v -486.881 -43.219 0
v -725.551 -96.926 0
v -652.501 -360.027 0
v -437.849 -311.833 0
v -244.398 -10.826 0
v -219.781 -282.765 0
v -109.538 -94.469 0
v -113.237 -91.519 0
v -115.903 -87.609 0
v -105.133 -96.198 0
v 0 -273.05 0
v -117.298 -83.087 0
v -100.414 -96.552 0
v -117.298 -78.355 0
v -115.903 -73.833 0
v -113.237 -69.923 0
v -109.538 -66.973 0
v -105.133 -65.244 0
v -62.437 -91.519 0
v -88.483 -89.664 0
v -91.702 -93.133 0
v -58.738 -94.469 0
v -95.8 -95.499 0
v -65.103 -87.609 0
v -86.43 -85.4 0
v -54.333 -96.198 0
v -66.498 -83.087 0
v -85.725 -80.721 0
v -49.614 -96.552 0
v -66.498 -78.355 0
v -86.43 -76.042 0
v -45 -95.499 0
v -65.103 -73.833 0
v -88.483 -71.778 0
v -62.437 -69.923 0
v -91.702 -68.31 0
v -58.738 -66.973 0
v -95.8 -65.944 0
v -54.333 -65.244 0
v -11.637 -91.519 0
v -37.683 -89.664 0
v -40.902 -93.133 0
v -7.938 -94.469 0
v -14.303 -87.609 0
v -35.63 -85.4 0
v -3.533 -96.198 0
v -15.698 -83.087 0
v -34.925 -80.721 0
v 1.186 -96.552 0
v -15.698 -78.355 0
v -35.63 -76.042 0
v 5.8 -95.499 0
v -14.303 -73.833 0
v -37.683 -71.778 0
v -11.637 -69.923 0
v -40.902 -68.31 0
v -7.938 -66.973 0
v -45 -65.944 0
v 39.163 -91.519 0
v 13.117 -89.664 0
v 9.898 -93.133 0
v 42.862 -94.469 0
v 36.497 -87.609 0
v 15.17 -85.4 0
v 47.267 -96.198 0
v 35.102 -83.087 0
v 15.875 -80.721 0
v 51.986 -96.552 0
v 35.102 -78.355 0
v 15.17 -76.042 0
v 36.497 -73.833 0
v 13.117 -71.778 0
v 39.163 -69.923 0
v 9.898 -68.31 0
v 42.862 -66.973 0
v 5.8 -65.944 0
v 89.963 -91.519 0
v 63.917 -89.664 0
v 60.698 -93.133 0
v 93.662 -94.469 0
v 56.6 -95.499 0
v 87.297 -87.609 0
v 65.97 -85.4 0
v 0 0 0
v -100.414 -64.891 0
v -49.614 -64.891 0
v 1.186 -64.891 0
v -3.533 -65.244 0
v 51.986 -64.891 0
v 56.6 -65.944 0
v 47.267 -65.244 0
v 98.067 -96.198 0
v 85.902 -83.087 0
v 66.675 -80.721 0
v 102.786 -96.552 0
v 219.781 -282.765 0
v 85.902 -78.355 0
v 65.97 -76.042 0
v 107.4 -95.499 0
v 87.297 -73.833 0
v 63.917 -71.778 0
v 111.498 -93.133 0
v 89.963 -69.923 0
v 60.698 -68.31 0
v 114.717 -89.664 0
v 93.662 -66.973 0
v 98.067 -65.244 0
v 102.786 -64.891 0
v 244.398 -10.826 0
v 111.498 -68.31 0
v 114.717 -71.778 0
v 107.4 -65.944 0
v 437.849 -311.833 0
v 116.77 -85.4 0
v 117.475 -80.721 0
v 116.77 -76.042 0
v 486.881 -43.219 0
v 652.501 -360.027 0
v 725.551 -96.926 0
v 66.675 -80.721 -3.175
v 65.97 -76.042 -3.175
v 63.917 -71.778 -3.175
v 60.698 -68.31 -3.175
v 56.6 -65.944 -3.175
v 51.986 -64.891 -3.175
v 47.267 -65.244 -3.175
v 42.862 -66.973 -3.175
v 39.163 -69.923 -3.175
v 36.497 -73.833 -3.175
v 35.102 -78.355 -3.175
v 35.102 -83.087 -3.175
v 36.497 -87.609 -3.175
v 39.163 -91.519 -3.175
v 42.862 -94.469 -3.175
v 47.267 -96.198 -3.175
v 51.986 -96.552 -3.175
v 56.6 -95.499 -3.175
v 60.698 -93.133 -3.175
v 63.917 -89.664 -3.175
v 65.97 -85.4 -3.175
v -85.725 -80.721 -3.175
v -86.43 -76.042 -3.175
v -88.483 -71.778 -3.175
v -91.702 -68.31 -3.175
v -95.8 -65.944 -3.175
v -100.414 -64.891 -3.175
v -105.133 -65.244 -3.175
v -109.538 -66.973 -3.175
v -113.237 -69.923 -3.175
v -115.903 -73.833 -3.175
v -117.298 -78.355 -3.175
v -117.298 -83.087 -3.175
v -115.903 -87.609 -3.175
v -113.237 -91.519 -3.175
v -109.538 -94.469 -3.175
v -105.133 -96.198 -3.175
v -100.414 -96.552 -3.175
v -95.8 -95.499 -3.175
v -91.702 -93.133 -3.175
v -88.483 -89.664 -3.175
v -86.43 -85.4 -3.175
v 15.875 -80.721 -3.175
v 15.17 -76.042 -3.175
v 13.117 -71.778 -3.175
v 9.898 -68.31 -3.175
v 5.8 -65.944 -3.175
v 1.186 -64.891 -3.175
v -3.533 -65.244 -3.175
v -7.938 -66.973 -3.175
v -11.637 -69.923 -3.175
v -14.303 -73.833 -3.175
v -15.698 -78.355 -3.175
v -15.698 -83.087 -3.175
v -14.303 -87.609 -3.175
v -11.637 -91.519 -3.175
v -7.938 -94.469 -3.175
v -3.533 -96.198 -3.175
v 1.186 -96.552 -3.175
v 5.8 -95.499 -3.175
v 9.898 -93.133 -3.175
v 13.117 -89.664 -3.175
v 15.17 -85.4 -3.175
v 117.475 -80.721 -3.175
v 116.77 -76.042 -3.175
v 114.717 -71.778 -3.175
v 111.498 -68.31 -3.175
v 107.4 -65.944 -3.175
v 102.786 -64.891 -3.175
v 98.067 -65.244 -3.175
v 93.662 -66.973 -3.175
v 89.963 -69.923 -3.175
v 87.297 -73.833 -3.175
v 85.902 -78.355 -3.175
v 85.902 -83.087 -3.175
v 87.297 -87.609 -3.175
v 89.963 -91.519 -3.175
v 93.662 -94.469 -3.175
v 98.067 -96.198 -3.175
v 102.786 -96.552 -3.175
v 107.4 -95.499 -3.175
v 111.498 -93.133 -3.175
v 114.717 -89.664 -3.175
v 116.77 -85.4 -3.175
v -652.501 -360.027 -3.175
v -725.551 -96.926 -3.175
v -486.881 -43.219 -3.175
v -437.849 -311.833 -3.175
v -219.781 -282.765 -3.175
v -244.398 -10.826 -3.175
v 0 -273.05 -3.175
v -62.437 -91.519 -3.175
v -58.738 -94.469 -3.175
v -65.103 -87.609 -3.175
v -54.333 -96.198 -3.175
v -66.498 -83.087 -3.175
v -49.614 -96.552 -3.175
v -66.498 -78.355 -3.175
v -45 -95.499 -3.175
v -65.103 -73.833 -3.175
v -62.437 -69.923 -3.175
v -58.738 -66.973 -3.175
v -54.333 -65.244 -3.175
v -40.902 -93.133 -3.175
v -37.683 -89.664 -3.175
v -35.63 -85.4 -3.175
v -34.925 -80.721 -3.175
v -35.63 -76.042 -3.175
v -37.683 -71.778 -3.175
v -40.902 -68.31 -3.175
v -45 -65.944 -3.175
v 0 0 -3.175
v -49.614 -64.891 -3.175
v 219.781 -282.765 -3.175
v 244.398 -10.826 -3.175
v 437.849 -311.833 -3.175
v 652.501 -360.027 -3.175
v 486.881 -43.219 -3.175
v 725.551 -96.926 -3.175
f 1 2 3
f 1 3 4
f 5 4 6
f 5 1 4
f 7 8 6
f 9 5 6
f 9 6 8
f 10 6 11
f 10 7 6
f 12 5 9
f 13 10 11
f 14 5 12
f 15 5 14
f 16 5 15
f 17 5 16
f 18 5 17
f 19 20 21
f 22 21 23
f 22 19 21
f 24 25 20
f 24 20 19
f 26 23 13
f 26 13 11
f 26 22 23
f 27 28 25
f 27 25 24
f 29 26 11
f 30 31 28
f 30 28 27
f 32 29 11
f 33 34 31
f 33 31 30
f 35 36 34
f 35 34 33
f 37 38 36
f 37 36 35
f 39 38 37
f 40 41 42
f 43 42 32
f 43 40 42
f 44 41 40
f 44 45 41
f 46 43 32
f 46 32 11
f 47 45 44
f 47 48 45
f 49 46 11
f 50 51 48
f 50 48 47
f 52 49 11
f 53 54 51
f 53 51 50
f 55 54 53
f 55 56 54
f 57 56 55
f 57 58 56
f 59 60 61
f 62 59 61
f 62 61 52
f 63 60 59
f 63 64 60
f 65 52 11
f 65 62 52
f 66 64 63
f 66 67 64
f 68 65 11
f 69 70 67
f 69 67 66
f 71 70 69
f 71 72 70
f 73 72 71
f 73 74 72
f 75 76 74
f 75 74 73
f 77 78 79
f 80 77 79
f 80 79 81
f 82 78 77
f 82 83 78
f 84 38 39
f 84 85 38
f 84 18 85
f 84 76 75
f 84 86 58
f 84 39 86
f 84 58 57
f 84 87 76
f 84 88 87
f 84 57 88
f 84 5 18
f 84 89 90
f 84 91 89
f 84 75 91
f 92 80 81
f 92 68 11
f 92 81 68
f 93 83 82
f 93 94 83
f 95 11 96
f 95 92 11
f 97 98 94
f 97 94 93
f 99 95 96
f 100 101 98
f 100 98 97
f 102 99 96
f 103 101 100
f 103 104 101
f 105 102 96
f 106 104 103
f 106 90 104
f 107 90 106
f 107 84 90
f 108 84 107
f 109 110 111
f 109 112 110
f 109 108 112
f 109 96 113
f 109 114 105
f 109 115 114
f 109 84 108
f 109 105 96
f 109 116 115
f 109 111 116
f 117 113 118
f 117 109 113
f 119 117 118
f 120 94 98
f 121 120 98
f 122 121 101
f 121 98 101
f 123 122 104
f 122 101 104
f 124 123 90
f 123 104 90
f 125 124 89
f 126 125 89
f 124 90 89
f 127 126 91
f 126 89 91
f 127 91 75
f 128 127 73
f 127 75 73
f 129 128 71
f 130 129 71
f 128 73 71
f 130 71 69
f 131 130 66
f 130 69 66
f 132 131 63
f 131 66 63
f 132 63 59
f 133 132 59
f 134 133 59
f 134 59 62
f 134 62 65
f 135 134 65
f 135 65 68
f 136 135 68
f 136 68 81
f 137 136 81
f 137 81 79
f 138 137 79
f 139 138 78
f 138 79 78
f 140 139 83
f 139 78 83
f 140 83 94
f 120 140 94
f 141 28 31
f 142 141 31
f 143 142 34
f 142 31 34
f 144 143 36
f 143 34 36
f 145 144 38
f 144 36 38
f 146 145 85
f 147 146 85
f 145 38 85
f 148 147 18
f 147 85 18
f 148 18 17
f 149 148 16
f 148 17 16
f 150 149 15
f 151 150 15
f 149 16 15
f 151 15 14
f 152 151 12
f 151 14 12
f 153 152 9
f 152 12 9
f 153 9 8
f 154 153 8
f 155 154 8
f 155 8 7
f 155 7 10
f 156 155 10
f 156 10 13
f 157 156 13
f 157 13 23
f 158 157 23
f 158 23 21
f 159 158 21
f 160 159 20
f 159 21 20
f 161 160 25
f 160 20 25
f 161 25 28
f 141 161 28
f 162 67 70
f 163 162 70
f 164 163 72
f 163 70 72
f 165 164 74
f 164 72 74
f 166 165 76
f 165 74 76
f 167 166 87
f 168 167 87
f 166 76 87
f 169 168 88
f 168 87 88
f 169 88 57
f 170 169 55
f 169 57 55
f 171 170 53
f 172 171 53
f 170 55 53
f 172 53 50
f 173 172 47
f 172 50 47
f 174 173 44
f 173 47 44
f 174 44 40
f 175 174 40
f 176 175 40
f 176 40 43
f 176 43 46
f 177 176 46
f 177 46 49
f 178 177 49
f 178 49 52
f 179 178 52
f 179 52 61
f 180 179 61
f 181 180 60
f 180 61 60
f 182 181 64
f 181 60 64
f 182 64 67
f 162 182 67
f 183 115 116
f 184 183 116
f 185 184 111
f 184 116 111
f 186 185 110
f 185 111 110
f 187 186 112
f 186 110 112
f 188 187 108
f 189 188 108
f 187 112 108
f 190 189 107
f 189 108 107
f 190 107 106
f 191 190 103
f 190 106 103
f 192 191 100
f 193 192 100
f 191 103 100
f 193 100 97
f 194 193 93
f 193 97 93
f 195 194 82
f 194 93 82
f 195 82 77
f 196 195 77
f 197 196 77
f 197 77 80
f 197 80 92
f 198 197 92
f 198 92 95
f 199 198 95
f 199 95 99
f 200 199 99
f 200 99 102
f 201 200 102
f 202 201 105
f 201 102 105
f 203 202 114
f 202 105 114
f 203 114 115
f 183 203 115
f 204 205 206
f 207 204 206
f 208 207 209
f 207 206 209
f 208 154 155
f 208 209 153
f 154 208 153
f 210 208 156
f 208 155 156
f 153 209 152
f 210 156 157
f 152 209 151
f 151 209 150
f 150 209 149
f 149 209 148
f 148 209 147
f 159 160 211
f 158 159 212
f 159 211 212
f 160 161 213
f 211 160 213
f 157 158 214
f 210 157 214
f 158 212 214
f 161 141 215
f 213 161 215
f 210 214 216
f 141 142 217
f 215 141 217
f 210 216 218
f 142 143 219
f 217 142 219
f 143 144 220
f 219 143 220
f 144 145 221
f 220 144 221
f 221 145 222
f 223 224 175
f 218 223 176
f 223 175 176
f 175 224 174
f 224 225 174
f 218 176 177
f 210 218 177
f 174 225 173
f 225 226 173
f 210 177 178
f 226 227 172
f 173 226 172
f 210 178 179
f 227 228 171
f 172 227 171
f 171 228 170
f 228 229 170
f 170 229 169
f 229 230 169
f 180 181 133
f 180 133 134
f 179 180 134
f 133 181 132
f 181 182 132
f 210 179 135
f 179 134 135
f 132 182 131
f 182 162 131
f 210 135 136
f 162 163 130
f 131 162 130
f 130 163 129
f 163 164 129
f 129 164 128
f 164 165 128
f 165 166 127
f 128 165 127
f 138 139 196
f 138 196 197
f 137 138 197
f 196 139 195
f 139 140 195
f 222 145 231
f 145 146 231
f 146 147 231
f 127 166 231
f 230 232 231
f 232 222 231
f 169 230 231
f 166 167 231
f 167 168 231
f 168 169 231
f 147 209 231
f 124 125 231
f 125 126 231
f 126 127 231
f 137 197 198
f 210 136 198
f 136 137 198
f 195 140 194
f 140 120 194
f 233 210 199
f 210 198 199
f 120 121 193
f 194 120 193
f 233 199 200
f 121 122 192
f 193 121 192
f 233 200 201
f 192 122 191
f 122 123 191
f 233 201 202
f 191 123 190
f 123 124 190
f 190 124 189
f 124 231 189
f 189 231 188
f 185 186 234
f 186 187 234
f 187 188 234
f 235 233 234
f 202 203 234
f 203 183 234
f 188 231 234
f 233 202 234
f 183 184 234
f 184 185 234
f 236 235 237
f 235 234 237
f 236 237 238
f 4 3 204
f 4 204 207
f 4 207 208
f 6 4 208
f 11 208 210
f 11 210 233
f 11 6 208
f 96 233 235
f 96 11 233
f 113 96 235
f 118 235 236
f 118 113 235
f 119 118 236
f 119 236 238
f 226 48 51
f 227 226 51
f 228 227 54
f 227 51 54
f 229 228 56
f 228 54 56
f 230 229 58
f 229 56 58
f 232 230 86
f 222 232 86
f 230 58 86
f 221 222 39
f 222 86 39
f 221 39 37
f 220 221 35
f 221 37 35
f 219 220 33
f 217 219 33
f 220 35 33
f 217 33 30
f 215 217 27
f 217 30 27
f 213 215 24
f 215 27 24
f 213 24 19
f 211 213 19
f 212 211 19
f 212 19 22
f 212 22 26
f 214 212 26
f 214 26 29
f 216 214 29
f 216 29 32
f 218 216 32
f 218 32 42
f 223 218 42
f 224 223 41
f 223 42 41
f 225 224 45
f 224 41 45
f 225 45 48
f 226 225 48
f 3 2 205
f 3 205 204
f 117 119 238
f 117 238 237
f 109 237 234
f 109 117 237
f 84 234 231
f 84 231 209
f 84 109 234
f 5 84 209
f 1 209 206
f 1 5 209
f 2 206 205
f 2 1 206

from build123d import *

# Parameters (mm, degrees)
SKETCH1_R          = 15.875
BASE_EXTRUDE_DEPTH = 3.175


with BuildPart() as part:
    # Sketch1 → Base-Extrude (new body)
    with BuildSketch(Plane.XY):
        with BuildLine():
            Line((-725.551, -96.926304331), (-652.5006, -360.027421394))
            ThreePointArc((-652.5006, -360.027421394), (0, -273.05), (652.5006, -360.027421394))
            Line((652.5006, -360.027421394), (725.551, -96.926304331))
            ThreePointArc((725.551, -96.926304331), (0, 0), (-725.551, -96.926304331))
        make_face()
        with Locations((0, -80.7212)):
            Circle(SKETCH1_R, mode=Mode.SUBTRACT)
        with Locations((-50.8, -80.7212)):
            Circle(SKETCH1_R, mode=Mode.SUBTRACT)
        with Locations((-101.6, -80.7212)):
            Circle(SKETCH1_R, mode=Mode.SUBTRACT)
        with Locations((50.8, -80.7212)):
            Circle(SKETCH1_R, mode=Mode.SUBTRACT)
        with Locations((101.6, -80.7212)):
            Circle(SKETCH1_R, mode=Mode.SUBTRACT)
    extrude(amount=-BASE_EXTRUDE_DEPTH)


solid = part.part
